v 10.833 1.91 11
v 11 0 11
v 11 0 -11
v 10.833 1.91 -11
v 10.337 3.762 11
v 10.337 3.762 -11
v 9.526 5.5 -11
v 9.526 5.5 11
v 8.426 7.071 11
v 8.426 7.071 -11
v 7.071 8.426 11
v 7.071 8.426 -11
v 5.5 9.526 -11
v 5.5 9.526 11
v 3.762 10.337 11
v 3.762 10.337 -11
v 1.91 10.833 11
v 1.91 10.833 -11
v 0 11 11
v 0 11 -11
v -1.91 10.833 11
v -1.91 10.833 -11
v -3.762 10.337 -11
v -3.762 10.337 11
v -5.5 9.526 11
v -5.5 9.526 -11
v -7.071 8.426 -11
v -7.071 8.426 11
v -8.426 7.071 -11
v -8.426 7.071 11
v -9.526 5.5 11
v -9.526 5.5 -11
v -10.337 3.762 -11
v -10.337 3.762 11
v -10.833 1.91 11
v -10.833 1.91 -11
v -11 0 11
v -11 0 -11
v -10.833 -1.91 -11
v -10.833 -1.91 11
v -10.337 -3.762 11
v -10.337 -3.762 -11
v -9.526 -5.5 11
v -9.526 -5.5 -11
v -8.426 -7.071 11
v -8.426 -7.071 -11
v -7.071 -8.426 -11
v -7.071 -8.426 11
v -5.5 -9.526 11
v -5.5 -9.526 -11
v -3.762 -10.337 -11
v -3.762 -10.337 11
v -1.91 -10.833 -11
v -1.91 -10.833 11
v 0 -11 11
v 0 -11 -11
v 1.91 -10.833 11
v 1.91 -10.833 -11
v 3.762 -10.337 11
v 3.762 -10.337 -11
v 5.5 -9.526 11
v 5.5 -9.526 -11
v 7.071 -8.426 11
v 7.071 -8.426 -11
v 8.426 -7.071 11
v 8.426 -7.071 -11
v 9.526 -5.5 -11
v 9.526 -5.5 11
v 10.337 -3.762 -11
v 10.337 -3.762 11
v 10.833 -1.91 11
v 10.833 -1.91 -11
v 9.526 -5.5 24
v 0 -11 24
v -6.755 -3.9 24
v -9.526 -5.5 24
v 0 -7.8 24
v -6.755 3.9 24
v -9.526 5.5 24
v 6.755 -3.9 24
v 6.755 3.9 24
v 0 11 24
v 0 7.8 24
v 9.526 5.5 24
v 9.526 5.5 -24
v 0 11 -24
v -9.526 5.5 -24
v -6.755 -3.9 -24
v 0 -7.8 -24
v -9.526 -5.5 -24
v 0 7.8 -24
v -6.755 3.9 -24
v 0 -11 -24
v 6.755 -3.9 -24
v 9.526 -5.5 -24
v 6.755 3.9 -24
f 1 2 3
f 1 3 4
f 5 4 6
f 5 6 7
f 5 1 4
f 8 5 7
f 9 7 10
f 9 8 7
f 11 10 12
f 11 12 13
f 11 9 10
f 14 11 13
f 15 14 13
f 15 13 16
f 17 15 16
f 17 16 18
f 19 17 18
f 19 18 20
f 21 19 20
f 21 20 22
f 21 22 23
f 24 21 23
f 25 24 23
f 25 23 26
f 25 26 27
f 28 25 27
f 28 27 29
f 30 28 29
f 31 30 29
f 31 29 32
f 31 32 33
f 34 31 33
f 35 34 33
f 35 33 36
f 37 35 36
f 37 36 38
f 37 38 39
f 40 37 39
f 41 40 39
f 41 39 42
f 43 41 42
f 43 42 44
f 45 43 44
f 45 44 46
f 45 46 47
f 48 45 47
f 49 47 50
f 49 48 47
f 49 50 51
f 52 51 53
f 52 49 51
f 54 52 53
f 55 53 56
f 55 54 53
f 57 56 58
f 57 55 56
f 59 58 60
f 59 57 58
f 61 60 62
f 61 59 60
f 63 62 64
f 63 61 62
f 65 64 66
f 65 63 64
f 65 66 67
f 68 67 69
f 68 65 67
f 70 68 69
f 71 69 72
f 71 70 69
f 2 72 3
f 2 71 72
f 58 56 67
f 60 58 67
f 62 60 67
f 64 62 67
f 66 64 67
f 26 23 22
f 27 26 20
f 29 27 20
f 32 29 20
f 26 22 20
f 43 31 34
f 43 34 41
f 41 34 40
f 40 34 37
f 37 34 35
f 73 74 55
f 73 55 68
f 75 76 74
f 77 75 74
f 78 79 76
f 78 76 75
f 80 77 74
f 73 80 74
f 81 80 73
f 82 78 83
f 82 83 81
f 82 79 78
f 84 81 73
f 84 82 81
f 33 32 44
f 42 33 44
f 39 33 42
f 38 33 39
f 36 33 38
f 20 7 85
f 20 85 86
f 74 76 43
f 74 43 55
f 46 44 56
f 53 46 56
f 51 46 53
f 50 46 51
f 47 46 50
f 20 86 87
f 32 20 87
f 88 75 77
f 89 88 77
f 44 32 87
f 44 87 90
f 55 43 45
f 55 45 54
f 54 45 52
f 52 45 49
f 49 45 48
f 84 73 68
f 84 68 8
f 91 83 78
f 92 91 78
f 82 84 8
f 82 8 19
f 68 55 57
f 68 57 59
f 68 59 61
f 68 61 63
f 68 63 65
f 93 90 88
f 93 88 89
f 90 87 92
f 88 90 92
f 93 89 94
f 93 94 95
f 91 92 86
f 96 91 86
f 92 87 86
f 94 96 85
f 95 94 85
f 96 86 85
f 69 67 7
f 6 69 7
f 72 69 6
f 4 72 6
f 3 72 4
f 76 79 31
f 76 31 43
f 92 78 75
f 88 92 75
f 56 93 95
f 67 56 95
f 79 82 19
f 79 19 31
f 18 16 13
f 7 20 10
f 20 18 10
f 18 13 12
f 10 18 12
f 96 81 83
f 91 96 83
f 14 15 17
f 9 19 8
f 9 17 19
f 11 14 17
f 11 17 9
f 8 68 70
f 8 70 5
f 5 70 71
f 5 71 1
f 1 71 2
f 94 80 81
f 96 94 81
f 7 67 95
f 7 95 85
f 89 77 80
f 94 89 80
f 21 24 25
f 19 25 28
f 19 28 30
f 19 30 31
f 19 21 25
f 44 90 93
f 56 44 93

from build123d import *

# Parameters (mm, degrees)
SKETCH1_R           = 11
SKETCH1_R_2         = 6.4
BOSS_EXTRUDE1_DEPTH = 11
BOSS_EXTRUDE2_DEPTH = 24
CUT_EXTRUDE3_DEPTH  = 51.457903246


with BuildPart() as part:
    # Sketch1 → Boss-Extrude1 (new, symmetric)
    with BuildSketch(Plane.XY):
        Circle(SKETCH1_R)
        Circle(SKETCH1_R_2, mode=Mode.SUBTRACT)
    extrude(amount=BOSS_EXTRUDE1_DEPTH, both=True)

    # Sketch1<3> → Boss-Extrude2 (add, symmetric)
    with BuildSketch(Plane.XY):
        Polygon((-9.526279442, -5.5), (0, -11), (9.526279442, -5.5), (9.526279442, 5.5), (0, 11), (-9.526279442, 5.5), align=None)
    extrude(amount=BOSS_EXTRUDE2_DEPTH, both=True)

    # Sketch2 → Cut-Extrude3 (cut, through all)
    with BuildSketch(Plane.XY.offset(24)):
        Polygon((0, -7.8), (6.75499815, -3.9), (6.75499815, 3.9), (0, 7.8), (-6.75499815, 3.9), (-6.75499815, -3.9), align=None)
    extrude(amount=-CUT_EXTRUDE3_DEPTH, mode=Mode.SUBTRACT)


solid = part.part
